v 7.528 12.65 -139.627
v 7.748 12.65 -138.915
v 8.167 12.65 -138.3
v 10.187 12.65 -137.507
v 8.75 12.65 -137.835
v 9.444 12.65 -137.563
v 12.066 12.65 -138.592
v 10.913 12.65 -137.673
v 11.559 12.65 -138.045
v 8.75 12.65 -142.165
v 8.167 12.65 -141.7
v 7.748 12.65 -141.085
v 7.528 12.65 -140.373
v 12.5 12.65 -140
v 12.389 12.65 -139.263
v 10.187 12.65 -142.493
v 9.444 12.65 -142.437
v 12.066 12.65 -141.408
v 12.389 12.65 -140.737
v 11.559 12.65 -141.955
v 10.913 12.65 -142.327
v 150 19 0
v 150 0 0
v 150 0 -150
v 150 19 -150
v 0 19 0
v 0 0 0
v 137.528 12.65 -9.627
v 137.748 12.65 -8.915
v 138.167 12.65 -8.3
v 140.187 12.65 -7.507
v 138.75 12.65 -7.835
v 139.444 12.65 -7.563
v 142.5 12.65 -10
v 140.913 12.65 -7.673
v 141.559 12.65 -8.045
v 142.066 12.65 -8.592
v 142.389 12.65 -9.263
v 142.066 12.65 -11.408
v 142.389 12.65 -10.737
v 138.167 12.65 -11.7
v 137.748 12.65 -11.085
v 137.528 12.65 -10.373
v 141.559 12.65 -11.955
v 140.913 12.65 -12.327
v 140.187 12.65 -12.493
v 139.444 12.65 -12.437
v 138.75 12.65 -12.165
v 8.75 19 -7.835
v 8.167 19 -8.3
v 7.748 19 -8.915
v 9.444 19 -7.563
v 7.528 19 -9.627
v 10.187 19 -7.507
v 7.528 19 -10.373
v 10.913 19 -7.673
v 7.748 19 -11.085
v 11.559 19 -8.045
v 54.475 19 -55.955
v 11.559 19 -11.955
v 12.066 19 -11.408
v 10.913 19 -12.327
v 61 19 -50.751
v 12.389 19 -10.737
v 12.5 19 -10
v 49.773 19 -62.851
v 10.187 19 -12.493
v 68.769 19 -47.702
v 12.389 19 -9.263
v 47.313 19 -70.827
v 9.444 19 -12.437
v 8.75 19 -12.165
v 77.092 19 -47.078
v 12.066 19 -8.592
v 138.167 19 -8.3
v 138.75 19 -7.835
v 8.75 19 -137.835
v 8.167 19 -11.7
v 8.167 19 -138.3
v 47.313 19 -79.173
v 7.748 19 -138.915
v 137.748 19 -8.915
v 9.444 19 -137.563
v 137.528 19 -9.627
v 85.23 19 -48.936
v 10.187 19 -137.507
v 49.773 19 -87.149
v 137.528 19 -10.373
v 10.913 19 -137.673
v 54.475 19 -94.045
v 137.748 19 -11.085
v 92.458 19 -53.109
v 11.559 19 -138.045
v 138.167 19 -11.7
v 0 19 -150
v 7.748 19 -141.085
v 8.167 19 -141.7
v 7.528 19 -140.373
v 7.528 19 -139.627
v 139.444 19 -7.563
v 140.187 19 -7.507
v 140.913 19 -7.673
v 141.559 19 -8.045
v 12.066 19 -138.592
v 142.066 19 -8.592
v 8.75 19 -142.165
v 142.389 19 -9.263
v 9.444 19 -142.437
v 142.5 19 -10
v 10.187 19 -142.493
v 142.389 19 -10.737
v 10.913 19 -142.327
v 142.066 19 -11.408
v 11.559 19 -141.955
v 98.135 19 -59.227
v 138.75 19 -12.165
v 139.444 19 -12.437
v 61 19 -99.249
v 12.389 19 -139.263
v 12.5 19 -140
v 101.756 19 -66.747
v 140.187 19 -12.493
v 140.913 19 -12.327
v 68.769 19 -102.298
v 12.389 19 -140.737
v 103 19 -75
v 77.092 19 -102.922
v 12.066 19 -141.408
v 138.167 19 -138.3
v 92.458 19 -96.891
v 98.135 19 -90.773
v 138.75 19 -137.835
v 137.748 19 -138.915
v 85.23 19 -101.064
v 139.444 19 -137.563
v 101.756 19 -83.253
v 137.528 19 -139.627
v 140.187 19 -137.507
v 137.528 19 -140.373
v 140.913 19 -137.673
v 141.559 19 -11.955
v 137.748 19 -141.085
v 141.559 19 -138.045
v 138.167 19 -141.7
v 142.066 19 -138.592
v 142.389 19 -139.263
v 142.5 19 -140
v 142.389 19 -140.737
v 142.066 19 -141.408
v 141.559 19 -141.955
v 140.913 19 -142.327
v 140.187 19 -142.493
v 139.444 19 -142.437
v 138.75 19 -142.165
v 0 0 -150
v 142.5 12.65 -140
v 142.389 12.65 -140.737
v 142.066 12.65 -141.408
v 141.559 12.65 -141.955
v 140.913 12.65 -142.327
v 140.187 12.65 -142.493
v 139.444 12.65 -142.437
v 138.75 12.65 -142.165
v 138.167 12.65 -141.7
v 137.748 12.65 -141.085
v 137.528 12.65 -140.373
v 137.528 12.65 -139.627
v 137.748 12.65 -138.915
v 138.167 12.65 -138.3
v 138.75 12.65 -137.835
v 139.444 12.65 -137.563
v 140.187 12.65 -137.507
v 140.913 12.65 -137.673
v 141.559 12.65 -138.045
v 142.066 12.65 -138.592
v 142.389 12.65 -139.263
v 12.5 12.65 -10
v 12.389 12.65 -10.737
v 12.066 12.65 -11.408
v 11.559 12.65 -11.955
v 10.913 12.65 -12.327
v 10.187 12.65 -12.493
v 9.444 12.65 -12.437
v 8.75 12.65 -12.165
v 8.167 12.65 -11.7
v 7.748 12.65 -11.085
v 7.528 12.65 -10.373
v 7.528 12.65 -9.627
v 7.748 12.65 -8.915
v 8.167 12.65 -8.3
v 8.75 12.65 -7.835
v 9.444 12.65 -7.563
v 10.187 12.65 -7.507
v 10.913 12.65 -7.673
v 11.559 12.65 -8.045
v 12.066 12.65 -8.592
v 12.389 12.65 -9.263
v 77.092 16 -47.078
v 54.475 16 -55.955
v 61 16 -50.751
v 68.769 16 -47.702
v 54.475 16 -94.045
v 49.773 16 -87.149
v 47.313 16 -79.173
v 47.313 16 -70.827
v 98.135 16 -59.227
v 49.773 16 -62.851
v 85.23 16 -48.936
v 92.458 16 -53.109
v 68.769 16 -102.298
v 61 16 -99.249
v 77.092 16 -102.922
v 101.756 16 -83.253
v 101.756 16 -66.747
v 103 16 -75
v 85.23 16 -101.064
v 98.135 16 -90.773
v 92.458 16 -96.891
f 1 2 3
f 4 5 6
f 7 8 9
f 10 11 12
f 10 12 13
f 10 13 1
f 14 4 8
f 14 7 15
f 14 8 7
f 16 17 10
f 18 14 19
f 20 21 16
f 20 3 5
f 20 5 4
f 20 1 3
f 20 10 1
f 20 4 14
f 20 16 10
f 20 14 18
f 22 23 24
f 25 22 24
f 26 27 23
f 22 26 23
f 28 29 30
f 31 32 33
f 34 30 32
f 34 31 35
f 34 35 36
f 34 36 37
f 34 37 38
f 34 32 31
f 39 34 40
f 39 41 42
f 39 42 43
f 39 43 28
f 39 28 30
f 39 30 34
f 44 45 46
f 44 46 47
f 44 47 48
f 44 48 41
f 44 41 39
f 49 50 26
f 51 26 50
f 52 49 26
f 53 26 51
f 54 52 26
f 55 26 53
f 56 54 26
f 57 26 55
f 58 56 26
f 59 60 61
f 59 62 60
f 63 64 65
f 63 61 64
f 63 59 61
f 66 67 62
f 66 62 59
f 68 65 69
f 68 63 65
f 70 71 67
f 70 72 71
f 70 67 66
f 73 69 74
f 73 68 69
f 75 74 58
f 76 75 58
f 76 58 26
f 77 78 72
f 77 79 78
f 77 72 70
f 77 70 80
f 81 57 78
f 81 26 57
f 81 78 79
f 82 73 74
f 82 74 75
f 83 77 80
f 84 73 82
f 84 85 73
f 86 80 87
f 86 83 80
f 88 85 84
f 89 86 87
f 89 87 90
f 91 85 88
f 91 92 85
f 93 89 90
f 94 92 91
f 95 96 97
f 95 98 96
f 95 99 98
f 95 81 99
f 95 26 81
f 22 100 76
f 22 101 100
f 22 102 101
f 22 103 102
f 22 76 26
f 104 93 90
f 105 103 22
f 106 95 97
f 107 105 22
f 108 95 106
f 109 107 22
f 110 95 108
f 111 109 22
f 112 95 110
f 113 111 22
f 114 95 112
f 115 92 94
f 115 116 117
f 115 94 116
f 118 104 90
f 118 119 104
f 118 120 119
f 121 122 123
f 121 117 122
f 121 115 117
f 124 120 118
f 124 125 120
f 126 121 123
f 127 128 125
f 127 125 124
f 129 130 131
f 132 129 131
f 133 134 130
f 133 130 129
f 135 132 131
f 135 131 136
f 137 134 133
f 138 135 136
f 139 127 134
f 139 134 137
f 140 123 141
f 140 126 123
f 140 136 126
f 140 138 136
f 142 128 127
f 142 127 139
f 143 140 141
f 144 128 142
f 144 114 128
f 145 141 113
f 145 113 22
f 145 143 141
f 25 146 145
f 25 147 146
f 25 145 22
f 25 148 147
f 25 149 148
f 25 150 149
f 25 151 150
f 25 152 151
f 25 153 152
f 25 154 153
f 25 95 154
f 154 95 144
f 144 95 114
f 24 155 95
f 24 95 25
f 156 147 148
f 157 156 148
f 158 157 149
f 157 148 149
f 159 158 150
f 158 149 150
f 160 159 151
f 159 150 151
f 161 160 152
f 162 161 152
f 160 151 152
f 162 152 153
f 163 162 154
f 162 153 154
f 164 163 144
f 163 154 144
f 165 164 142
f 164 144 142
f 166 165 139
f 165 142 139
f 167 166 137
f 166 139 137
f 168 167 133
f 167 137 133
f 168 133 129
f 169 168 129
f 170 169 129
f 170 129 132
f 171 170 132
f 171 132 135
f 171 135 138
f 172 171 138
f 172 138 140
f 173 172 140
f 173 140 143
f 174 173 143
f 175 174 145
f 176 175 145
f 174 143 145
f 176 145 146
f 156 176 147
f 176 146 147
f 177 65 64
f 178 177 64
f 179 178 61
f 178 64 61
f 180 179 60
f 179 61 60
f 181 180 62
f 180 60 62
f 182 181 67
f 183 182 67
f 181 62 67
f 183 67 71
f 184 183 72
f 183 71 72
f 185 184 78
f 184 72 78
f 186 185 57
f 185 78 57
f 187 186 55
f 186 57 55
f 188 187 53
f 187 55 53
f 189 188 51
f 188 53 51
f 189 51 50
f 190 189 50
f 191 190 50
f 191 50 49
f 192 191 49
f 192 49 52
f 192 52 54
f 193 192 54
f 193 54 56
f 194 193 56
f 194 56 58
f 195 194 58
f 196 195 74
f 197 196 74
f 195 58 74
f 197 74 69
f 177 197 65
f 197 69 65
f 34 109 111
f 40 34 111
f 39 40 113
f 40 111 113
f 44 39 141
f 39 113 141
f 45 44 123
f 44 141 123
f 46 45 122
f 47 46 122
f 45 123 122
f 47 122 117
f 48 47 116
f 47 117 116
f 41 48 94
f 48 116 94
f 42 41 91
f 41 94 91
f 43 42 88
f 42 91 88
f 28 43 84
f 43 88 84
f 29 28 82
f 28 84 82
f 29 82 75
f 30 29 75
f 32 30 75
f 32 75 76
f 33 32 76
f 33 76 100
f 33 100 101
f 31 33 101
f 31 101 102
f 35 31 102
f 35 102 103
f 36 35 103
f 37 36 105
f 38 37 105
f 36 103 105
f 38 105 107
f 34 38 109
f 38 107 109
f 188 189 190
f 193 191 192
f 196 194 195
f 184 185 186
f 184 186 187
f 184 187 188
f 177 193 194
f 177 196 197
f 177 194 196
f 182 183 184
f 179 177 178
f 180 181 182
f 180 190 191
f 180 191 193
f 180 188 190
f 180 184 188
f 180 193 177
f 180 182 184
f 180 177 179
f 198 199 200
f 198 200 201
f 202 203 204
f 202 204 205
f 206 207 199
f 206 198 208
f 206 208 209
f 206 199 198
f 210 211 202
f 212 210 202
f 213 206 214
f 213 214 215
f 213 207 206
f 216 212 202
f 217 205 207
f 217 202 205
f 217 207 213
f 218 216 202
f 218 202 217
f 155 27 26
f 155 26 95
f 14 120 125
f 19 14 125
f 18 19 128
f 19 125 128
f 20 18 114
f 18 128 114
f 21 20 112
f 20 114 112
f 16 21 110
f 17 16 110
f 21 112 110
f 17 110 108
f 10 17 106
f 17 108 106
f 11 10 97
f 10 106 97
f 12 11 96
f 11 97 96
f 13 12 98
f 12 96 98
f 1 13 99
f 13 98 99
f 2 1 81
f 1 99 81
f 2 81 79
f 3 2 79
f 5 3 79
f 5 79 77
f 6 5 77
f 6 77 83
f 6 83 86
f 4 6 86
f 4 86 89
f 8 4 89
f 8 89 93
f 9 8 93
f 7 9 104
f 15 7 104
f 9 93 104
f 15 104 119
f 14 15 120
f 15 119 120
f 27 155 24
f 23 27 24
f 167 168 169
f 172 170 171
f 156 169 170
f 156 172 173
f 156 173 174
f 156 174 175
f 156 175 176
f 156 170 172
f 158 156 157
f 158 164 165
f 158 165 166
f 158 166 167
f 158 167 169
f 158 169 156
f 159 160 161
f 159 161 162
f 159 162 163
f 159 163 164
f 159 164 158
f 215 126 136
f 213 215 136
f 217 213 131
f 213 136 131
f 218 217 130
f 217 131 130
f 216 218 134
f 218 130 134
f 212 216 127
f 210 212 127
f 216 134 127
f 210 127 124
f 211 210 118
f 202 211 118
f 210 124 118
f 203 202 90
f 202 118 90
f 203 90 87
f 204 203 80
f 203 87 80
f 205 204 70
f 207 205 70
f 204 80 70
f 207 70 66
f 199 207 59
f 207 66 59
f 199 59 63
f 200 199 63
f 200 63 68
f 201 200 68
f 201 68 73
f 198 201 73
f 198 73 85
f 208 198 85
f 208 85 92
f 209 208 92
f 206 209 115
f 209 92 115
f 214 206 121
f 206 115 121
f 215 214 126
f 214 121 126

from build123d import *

# Parameters (mm, degrees)
SKETCH1_W           = 150
SKETCH1_H           = 150
BOSS_EXTRUDE1_DEPTH = 19
SKETCH2_R           = 28
CUT_EXTRUDE1_DEPTH  = 3
SKETCH4_R           = 2.5
CUT_EXTRUDE2_DEPTH  = 6.35


with BuildPart() as part:
    # Sketch1 → Boss-Extrude1 (new body)
    with BuildSketch(Plane(origin=(0, 0, 0), x_dir=(1, 0, 0), z_dir=(0, 1, 0))):
        with Locations((75, 75)):
            Rectangle(SKETCH1_W, SKETCH1_H)
    extrude(amount=BOSS_EXTRUDE1_DEPTH)

    # Sketch2 → Cut-Extrude1 (cut)
    with BuildSketch(Plane(origin=(0, 19, 0), x_dir=(1, 0, 0), z_dir=(0, 1, 0))):
        with Locations((75, 75)):
            Circle(SKETCH2_R)
    extrude(amount=-CUT_EXTRUDE1_DEPTH, mode=Mode.SUBTRACT)

    # Sketch4 → Cut-Extrude2 (cut)
    with BuildSketch(Plane(origin=(0, 19, 0), x_dir=(1, 0, 0), z_dir=(0, 1, 0))):
        with Locations((10, 140)):
            Circle(SKETCH4_R)
        with Locations((140, 140)):
            Circle(SKETCH4_R)
        with Locations((140, 10)):
            Circle(SKETCH4_R)
        with Locations((10, 10)):
            Circle(SKETCH4_R)
    extrude(amount=-CUT_EXTRUDE2_DEPTH, mode=Mode.SUBTRACT)


solid = part.part
